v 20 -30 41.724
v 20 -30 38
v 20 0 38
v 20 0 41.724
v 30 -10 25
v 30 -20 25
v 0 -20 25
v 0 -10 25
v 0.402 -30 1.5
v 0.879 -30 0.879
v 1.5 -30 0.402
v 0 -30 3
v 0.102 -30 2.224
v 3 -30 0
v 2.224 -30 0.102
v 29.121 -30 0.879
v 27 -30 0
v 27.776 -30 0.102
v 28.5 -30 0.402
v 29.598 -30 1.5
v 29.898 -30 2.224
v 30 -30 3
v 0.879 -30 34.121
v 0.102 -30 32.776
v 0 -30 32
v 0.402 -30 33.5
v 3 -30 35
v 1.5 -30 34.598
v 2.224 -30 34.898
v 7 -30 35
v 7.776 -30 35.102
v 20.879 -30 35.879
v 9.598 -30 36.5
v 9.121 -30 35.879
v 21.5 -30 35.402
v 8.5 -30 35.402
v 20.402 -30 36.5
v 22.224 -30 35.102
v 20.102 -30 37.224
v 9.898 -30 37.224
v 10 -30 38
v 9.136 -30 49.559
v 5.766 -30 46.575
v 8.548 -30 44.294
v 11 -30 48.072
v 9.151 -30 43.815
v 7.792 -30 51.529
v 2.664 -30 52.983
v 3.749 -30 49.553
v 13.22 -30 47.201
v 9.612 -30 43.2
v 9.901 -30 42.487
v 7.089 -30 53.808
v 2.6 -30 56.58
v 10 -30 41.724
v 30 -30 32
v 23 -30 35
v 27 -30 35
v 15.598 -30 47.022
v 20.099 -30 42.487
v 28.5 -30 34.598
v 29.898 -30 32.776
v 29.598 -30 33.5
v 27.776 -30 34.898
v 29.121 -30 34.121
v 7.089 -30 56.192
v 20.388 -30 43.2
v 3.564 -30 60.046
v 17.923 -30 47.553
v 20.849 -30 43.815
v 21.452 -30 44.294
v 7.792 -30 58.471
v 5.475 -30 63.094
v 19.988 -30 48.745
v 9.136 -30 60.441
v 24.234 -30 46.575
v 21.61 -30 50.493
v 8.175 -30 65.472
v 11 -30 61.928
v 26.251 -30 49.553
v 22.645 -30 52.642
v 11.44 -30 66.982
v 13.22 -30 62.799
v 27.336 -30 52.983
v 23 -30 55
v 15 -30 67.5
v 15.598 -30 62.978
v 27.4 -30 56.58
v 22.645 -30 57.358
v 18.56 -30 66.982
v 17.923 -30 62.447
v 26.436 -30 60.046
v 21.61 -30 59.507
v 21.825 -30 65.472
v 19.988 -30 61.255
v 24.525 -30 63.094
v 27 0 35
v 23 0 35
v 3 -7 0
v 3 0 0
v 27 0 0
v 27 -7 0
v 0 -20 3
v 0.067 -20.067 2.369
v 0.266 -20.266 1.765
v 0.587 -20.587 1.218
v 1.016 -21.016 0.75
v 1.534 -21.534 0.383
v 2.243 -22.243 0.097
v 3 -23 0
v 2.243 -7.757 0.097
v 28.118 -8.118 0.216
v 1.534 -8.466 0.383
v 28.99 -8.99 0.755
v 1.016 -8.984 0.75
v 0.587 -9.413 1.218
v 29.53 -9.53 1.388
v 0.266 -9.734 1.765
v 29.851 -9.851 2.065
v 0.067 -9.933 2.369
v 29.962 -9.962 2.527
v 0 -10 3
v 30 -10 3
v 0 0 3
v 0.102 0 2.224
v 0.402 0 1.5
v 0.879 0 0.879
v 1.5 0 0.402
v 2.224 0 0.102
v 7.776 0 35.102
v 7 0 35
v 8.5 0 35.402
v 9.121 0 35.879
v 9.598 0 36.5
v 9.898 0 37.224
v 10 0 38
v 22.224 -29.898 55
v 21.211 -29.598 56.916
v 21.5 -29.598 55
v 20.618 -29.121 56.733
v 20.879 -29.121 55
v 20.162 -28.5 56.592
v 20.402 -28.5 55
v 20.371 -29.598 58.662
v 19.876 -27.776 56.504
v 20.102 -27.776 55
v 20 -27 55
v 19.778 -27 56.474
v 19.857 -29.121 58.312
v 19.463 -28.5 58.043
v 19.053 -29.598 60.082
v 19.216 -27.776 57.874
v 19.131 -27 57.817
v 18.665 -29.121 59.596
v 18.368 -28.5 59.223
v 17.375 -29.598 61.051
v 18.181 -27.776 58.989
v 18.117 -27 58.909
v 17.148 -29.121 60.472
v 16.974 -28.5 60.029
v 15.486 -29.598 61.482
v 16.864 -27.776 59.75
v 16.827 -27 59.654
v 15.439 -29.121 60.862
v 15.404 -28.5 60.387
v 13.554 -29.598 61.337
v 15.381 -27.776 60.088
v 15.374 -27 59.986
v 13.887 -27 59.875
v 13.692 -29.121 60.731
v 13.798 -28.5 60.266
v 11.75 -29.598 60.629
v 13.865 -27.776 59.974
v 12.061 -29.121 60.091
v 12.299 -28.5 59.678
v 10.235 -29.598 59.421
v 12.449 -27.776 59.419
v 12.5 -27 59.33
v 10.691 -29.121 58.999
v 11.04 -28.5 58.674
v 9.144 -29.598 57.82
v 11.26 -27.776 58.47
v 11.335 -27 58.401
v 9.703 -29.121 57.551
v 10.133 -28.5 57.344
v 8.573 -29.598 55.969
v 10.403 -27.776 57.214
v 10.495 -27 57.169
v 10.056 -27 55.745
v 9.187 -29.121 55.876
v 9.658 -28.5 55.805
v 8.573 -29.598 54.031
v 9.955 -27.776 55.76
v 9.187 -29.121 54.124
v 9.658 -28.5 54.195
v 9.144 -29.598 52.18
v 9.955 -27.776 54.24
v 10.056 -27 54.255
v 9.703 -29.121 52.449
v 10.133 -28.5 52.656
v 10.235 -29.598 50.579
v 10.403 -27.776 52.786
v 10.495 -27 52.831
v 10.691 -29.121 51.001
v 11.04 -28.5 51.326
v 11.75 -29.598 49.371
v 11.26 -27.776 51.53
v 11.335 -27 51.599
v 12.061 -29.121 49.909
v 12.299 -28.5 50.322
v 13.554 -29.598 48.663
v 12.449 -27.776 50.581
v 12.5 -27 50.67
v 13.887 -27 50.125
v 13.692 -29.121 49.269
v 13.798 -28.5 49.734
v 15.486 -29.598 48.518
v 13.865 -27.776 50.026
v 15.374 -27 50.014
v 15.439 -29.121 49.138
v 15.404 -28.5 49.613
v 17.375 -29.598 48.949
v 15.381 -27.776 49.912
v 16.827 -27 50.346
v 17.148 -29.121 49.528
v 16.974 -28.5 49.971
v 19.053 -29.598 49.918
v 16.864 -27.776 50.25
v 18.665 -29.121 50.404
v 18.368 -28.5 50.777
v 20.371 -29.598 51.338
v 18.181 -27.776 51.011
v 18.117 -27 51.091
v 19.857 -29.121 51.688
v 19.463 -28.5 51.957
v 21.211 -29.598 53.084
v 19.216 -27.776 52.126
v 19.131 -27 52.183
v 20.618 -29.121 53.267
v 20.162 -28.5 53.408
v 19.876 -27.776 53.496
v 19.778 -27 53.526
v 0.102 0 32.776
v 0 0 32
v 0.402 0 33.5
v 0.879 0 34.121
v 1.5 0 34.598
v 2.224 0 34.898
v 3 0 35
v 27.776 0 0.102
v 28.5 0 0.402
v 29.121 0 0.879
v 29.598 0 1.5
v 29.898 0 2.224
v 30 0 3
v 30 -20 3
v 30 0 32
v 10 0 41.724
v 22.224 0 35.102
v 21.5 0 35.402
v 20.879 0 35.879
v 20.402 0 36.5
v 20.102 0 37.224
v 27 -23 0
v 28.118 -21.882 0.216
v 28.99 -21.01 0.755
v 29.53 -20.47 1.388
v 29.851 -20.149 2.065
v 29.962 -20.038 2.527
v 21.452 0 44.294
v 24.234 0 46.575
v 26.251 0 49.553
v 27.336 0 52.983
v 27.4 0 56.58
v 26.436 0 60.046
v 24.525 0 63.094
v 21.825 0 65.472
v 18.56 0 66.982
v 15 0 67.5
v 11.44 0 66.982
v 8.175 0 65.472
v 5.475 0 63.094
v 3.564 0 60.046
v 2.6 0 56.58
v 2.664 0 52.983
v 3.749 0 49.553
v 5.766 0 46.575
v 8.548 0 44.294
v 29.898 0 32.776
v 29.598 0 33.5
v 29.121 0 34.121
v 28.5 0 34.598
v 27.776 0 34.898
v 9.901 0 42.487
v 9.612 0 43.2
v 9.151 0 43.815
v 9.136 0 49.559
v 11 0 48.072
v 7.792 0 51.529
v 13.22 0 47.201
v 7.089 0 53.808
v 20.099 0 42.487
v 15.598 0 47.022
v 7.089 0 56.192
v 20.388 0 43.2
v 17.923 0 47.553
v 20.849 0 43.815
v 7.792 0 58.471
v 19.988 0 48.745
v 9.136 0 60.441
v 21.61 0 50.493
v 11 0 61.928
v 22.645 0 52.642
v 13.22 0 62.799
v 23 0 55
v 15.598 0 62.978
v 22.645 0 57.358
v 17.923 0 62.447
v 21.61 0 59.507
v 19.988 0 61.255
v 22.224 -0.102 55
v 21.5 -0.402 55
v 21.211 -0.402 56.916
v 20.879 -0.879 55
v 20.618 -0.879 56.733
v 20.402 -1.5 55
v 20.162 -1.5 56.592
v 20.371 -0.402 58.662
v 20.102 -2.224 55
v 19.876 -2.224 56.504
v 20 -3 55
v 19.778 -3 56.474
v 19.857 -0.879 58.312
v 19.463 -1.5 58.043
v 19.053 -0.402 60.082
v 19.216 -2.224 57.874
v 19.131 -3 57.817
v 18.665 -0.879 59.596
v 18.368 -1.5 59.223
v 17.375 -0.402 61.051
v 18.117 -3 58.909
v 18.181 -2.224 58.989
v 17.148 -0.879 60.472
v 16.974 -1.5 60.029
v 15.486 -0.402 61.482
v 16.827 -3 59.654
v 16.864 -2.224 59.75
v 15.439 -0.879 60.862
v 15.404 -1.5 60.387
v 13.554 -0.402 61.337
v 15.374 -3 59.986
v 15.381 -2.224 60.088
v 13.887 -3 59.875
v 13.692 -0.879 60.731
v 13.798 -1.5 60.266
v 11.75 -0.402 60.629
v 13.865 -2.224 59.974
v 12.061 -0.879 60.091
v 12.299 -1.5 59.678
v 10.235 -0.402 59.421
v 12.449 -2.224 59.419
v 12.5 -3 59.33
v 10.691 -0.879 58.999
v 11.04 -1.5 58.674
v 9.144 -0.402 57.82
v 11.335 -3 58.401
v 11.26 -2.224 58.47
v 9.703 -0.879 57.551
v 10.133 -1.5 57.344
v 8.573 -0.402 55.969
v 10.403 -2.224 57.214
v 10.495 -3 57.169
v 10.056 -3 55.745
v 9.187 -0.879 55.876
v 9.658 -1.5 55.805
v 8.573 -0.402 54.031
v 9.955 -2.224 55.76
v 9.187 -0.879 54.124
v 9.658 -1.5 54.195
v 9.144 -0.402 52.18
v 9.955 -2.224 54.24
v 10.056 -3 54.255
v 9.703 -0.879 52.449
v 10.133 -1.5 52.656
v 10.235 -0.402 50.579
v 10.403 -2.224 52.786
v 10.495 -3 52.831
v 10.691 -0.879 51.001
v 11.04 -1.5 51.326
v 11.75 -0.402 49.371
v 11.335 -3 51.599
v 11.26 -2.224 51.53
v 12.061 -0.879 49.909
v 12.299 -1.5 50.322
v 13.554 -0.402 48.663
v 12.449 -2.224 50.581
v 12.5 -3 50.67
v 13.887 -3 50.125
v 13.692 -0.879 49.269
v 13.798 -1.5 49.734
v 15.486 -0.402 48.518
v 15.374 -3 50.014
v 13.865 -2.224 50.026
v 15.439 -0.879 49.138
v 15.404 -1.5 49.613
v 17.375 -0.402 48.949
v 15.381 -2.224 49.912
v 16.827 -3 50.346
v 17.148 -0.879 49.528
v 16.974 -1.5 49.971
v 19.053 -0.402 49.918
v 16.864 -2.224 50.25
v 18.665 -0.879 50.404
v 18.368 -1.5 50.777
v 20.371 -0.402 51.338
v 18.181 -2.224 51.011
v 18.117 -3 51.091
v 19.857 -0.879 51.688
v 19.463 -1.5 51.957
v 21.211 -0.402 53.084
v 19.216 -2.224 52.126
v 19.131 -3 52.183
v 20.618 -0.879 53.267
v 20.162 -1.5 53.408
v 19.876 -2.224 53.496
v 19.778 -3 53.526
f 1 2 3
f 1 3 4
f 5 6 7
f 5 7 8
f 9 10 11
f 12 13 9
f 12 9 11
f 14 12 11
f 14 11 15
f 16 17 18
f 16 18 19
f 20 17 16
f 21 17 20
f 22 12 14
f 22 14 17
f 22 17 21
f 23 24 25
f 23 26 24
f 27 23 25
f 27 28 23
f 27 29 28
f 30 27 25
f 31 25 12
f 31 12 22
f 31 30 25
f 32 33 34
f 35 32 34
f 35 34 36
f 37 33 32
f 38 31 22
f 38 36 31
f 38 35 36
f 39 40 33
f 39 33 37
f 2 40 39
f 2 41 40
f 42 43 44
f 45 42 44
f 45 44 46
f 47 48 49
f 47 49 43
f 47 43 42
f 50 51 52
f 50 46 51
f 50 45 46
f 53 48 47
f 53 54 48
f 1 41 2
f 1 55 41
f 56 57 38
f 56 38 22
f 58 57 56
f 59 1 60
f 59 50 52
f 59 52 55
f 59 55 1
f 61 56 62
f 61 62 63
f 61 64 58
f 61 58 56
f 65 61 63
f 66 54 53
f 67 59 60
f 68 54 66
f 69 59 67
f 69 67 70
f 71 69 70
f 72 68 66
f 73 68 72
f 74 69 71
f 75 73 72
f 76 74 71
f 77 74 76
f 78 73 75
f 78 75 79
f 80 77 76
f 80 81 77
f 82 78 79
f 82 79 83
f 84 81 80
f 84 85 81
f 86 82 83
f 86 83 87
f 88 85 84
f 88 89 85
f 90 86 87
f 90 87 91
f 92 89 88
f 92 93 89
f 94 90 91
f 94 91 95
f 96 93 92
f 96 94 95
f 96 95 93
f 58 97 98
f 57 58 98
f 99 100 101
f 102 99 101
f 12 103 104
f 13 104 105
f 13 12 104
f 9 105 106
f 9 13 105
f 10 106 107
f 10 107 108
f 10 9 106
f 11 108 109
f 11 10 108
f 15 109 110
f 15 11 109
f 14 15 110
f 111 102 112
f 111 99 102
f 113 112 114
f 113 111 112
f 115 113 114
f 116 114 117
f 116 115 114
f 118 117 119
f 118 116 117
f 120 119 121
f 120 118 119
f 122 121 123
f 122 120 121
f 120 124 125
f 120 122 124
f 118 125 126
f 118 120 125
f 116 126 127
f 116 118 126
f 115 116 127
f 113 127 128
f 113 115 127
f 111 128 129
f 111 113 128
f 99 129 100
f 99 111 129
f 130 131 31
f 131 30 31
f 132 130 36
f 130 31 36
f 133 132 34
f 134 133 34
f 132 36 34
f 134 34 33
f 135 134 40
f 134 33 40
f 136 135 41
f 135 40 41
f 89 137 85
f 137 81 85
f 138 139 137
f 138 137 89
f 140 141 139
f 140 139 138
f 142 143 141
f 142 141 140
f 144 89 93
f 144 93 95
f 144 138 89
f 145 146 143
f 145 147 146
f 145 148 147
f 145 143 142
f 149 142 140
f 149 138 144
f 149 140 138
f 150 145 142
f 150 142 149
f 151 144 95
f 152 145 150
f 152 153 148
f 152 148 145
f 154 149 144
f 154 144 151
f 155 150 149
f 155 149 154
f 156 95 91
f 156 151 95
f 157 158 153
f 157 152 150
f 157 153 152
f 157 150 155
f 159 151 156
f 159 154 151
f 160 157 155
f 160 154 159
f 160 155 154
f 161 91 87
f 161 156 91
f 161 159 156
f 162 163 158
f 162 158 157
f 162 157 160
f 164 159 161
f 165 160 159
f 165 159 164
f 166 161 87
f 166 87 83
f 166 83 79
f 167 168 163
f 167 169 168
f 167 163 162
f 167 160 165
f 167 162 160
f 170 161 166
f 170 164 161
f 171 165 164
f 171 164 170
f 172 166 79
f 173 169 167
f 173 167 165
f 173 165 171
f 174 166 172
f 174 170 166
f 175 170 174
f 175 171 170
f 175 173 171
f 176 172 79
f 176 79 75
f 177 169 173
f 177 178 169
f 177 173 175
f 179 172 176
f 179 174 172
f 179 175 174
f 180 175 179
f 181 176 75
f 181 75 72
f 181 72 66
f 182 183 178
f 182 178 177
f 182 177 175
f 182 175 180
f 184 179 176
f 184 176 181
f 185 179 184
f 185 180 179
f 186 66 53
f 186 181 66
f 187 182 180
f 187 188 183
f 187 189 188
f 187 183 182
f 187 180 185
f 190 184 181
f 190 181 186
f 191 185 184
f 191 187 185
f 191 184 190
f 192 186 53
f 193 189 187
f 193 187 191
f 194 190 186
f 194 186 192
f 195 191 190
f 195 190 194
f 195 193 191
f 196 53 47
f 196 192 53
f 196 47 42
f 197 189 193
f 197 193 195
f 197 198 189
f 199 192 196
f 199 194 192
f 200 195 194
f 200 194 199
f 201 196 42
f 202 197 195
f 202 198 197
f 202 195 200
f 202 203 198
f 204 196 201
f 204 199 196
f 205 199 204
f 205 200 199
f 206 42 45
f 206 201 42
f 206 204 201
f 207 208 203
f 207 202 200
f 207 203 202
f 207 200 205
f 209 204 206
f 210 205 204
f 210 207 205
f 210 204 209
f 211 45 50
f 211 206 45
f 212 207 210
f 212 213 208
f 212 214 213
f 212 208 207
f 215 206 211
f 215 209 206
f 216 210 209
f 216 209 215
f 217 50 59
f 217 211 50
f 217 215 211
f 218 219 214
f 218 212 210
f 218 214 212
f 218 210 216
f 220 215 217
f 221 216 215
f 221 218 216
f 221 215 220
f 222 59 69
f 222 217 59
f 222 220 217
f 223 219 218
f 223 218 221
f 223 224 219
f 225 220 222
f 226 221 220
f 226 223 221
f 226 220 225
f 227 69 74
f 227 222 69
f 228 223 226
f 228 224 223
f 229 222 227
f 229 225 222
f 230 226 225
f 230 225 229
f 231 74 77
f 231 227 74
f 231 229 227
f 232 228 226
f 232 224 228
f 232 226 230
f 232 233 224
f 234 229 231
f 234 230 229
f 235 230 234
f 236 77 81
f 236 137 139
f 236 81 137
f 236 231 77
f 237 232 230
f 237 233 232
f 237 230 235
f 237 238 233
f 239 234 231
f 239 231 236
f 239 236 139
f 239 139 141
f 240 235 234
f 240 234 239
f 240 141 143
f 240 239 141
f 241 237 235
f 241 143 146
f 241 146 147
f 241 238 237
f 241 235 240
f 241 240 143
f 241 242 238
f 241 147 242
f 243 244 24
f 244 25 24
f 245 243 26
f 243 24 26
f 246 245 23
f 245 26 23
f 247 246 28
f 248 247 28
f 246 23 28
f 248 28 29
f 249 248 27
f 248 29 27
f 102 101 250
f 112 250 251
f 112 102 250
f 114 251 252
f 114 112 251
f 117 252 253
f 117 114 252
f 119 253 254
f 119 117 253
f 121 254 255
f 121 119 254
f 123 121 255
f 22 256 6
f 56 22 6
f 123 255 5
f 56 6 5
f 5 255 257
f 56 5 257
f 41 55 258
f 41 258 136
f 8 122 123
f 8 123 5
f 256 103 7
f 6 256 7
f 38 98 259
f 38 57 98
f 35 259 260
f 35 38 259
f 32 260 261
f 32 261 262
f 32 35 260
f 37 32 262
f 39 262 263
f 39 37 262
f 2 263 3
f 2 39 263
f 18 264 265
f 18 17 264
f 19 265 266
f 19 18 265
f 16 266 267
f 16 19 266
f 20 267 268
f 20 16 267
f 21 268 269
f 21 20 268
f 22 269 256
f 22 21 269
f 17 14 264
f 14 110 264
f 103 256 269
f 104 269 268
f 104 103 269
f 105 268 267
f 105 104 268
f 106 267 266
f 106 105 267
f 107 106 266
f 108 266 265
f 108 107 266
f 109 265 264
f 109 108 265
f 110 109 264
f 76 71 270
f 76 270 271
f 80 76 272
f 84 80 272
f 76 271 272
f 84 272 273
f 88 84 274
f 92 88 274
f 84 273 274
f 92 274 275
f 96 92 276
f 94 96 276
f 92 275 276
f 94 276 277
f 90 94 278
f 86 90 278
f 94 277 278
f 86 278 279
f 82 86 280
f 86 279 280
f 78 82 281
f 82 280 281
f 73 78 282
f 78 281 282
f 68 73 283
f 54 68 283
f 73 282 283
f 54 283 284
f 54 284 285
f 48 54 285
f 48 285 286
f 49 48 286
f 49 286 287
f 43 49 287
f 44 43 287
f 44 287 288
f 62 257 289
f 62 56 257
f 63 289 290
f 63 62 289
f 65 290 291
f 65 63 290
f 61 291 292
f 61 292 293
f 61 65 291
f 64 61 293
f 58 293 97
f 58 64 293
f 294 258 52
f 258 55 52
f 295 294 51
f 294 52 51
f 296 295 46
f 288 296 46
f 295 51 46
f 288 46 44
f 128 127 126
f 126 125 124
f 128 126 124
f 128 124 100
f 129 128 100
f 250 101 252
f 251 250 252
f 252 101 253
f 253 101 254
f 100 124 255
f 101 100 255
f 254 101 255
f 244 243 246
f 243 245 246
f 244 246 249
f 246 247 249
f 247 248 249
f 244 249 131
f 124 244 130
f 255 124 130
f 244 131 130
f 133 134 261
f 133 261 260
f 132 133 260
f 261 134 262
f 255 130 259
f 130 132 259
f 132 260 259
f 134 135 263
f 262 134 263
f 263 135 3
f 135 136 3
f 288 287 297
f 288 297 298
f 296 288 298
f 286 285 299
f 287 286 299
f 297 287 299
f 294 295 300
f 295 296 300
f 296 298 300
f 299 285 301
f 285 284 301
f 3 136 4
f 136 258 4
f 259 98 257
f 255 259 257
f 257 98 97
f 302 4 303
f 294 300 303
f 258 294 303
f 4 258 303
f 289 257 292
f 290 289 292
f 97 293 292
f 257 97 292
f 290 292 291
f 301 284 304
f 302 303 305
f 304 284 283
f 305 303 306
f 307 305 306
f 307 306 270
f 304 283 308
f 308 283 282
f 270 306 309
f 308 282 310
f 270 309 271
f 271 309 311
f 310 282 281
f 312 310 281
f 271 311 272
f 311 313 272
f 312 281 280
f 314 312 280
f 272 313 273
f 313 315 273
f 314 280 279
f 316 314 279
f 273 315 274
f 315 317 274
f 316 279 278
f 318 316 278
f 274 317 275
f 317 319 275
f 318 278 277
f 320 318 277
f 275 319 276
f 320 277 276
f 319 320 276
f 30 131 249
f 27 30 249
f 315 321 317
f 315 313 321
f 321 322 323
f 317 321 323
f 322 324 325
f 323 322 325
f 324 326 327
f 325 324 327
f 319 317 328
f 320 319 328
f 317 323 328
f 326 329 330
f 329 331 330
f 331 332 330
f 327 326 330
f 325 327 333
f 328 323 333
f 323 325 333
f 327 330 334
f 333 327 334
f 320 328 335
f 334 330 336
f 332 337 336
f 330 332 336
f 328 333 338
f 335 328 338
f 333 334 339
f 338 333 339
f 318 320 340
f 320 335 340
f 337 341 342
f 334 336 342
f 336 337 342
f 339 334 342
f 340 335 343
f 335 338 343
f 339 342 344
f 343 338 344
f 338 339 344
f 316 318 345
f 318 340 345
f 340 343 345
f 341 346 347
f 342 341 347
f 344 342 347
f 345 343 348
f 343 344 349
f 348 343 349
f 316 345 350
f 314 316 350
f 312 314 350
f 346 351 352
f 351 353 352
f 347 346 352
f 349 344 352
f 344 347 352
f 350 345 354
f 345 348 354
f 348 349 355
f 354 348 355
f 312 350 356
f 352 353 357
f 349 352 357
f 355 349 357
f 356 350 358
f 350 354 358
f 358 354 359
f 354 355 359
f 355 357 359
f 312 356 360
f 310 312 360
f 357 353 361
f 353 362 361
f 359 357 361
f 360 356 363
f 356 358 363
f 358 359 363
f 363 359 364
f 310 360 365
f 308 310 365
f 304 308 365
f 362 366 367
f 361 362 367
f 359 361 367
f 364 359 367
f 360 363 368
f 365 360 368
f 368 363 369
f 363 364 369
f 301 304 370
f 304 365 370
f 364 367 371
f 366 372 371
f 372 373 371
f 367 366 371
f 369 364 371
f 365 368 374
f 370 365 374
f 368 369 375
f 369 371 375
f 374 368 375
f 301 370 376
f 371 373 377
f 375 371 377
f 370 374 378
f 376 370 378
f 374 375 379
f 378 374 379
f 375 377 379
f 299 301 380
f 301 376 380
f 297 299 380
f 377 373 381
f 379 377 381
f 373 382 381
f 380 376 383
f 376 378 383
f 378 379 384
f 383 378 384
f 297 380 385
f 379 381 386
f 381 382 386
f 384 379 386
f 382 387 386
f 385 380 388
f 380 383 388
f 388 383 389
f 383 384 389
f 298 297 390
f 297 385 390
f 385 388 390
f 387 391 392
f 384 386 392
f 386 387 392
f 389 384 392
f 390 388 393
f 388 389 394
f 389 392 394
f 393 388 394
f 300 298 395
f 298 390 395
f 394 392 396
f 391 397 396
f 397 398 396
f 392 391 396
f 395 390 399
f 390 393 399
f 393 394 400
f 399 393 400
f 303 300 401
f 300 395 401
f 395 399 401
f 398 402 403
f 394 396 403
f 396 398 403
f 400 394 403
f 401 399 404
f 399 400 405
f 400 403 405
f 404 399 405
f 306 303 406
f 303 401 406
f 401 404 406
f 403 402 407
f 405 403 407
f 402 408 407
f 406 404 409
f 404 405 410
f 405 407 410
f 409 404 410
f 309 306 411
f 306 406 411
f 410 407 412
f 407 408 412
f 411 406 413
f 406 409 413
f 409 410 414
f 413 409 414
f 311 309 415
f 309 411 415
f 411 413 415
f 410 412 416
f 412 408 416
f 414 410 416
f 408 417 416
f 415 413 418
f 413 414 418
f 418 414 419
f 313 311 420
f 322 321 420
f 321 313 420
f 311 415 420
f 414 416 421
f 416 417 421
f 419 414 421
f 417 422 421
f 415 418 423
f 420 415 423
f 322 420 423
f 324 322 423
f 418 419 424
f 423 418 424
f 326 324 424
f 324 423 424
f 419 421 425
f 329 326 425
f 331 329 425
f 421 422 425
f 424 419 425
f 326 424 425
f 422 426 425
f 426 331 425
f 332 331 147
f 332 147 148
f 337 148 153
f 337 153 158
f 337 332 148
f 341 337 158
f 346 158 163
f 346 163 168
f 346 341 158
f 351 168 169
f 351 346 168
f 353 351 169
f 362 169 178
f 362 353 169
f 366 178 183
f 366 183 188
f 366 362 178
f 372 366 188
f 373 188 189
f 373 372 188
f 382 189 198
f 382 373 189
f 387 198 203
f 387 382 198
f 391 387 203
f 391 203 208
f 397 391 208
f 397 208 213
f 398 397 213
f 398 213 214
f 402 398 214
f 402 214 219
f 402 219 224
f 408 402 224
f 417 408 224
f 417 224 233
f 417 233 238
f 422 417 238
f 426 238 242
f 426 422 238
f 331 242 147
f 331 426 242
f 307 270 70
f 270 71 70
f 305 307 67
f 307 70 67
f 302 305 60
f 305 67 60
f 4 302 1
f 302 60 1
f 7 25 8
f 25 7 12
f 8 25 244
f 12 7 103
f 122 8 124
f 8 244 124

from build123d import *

# Parameters (mm, degrees)
F0_R     = 5
F1_DEPTH = 30
F2_W     = 10
F2_H     = 25
F3_DEPTH = 30.001
F4_R     = 3


with BuildPart() as f1:
    # F0 (on Front) → F1 (new body)
    with BuildSketch(Plane.XZ):
        Polygon((0, 35), (0, 0), (30, 0), (30, 35), (20, 35), (10, 35), align=None)
        with BuildLine():
            Line((10, 43.5435607626), (10, 35))
            Line((10, 35), (20, 35))
            Line((20, 35), (20, 43.5435607626))
            ThreePointArc((20, 43.5435607626), (15, 67.5), (10, 43.5435607626))
        make_face()
        with Locations((15, 55)):
            Circle(F0_R, mode=Mode.SUBTRACT)
    extrude(amount=F1_DEPTH)

    # F2 (on face) → F3 (cut, through all)
    with BuildSketch(Plane.YZ.offset(30)):
        with Locations((-15, 12.5)):
            Rectangle(F2_W, F2_H)
    extrude(amount=-F3_DEPTH, mode=Mode.SUBTRACT)

    # F4
    f4_edges = [f1.edges().sort_by_distance(p)[0] for p in [
        (10, -30, 55),
        (10, 0, 55),
        (20, -15, 43.543561),
        (20, -15, 35),
        (10, -15, 35),
        (10, -15, 43.543561),
        (30, -15, 35),
        (0, -15, 35),
        (30, -25, 0),
        (30, -5, 0),
        (0, -25, 0),
        (0, -5, 0),
        (15, -20, 0),
        (15, -10, 0),
    ]]
    fillet(f4_edges, radius=F4_R)


solid = f1.part
